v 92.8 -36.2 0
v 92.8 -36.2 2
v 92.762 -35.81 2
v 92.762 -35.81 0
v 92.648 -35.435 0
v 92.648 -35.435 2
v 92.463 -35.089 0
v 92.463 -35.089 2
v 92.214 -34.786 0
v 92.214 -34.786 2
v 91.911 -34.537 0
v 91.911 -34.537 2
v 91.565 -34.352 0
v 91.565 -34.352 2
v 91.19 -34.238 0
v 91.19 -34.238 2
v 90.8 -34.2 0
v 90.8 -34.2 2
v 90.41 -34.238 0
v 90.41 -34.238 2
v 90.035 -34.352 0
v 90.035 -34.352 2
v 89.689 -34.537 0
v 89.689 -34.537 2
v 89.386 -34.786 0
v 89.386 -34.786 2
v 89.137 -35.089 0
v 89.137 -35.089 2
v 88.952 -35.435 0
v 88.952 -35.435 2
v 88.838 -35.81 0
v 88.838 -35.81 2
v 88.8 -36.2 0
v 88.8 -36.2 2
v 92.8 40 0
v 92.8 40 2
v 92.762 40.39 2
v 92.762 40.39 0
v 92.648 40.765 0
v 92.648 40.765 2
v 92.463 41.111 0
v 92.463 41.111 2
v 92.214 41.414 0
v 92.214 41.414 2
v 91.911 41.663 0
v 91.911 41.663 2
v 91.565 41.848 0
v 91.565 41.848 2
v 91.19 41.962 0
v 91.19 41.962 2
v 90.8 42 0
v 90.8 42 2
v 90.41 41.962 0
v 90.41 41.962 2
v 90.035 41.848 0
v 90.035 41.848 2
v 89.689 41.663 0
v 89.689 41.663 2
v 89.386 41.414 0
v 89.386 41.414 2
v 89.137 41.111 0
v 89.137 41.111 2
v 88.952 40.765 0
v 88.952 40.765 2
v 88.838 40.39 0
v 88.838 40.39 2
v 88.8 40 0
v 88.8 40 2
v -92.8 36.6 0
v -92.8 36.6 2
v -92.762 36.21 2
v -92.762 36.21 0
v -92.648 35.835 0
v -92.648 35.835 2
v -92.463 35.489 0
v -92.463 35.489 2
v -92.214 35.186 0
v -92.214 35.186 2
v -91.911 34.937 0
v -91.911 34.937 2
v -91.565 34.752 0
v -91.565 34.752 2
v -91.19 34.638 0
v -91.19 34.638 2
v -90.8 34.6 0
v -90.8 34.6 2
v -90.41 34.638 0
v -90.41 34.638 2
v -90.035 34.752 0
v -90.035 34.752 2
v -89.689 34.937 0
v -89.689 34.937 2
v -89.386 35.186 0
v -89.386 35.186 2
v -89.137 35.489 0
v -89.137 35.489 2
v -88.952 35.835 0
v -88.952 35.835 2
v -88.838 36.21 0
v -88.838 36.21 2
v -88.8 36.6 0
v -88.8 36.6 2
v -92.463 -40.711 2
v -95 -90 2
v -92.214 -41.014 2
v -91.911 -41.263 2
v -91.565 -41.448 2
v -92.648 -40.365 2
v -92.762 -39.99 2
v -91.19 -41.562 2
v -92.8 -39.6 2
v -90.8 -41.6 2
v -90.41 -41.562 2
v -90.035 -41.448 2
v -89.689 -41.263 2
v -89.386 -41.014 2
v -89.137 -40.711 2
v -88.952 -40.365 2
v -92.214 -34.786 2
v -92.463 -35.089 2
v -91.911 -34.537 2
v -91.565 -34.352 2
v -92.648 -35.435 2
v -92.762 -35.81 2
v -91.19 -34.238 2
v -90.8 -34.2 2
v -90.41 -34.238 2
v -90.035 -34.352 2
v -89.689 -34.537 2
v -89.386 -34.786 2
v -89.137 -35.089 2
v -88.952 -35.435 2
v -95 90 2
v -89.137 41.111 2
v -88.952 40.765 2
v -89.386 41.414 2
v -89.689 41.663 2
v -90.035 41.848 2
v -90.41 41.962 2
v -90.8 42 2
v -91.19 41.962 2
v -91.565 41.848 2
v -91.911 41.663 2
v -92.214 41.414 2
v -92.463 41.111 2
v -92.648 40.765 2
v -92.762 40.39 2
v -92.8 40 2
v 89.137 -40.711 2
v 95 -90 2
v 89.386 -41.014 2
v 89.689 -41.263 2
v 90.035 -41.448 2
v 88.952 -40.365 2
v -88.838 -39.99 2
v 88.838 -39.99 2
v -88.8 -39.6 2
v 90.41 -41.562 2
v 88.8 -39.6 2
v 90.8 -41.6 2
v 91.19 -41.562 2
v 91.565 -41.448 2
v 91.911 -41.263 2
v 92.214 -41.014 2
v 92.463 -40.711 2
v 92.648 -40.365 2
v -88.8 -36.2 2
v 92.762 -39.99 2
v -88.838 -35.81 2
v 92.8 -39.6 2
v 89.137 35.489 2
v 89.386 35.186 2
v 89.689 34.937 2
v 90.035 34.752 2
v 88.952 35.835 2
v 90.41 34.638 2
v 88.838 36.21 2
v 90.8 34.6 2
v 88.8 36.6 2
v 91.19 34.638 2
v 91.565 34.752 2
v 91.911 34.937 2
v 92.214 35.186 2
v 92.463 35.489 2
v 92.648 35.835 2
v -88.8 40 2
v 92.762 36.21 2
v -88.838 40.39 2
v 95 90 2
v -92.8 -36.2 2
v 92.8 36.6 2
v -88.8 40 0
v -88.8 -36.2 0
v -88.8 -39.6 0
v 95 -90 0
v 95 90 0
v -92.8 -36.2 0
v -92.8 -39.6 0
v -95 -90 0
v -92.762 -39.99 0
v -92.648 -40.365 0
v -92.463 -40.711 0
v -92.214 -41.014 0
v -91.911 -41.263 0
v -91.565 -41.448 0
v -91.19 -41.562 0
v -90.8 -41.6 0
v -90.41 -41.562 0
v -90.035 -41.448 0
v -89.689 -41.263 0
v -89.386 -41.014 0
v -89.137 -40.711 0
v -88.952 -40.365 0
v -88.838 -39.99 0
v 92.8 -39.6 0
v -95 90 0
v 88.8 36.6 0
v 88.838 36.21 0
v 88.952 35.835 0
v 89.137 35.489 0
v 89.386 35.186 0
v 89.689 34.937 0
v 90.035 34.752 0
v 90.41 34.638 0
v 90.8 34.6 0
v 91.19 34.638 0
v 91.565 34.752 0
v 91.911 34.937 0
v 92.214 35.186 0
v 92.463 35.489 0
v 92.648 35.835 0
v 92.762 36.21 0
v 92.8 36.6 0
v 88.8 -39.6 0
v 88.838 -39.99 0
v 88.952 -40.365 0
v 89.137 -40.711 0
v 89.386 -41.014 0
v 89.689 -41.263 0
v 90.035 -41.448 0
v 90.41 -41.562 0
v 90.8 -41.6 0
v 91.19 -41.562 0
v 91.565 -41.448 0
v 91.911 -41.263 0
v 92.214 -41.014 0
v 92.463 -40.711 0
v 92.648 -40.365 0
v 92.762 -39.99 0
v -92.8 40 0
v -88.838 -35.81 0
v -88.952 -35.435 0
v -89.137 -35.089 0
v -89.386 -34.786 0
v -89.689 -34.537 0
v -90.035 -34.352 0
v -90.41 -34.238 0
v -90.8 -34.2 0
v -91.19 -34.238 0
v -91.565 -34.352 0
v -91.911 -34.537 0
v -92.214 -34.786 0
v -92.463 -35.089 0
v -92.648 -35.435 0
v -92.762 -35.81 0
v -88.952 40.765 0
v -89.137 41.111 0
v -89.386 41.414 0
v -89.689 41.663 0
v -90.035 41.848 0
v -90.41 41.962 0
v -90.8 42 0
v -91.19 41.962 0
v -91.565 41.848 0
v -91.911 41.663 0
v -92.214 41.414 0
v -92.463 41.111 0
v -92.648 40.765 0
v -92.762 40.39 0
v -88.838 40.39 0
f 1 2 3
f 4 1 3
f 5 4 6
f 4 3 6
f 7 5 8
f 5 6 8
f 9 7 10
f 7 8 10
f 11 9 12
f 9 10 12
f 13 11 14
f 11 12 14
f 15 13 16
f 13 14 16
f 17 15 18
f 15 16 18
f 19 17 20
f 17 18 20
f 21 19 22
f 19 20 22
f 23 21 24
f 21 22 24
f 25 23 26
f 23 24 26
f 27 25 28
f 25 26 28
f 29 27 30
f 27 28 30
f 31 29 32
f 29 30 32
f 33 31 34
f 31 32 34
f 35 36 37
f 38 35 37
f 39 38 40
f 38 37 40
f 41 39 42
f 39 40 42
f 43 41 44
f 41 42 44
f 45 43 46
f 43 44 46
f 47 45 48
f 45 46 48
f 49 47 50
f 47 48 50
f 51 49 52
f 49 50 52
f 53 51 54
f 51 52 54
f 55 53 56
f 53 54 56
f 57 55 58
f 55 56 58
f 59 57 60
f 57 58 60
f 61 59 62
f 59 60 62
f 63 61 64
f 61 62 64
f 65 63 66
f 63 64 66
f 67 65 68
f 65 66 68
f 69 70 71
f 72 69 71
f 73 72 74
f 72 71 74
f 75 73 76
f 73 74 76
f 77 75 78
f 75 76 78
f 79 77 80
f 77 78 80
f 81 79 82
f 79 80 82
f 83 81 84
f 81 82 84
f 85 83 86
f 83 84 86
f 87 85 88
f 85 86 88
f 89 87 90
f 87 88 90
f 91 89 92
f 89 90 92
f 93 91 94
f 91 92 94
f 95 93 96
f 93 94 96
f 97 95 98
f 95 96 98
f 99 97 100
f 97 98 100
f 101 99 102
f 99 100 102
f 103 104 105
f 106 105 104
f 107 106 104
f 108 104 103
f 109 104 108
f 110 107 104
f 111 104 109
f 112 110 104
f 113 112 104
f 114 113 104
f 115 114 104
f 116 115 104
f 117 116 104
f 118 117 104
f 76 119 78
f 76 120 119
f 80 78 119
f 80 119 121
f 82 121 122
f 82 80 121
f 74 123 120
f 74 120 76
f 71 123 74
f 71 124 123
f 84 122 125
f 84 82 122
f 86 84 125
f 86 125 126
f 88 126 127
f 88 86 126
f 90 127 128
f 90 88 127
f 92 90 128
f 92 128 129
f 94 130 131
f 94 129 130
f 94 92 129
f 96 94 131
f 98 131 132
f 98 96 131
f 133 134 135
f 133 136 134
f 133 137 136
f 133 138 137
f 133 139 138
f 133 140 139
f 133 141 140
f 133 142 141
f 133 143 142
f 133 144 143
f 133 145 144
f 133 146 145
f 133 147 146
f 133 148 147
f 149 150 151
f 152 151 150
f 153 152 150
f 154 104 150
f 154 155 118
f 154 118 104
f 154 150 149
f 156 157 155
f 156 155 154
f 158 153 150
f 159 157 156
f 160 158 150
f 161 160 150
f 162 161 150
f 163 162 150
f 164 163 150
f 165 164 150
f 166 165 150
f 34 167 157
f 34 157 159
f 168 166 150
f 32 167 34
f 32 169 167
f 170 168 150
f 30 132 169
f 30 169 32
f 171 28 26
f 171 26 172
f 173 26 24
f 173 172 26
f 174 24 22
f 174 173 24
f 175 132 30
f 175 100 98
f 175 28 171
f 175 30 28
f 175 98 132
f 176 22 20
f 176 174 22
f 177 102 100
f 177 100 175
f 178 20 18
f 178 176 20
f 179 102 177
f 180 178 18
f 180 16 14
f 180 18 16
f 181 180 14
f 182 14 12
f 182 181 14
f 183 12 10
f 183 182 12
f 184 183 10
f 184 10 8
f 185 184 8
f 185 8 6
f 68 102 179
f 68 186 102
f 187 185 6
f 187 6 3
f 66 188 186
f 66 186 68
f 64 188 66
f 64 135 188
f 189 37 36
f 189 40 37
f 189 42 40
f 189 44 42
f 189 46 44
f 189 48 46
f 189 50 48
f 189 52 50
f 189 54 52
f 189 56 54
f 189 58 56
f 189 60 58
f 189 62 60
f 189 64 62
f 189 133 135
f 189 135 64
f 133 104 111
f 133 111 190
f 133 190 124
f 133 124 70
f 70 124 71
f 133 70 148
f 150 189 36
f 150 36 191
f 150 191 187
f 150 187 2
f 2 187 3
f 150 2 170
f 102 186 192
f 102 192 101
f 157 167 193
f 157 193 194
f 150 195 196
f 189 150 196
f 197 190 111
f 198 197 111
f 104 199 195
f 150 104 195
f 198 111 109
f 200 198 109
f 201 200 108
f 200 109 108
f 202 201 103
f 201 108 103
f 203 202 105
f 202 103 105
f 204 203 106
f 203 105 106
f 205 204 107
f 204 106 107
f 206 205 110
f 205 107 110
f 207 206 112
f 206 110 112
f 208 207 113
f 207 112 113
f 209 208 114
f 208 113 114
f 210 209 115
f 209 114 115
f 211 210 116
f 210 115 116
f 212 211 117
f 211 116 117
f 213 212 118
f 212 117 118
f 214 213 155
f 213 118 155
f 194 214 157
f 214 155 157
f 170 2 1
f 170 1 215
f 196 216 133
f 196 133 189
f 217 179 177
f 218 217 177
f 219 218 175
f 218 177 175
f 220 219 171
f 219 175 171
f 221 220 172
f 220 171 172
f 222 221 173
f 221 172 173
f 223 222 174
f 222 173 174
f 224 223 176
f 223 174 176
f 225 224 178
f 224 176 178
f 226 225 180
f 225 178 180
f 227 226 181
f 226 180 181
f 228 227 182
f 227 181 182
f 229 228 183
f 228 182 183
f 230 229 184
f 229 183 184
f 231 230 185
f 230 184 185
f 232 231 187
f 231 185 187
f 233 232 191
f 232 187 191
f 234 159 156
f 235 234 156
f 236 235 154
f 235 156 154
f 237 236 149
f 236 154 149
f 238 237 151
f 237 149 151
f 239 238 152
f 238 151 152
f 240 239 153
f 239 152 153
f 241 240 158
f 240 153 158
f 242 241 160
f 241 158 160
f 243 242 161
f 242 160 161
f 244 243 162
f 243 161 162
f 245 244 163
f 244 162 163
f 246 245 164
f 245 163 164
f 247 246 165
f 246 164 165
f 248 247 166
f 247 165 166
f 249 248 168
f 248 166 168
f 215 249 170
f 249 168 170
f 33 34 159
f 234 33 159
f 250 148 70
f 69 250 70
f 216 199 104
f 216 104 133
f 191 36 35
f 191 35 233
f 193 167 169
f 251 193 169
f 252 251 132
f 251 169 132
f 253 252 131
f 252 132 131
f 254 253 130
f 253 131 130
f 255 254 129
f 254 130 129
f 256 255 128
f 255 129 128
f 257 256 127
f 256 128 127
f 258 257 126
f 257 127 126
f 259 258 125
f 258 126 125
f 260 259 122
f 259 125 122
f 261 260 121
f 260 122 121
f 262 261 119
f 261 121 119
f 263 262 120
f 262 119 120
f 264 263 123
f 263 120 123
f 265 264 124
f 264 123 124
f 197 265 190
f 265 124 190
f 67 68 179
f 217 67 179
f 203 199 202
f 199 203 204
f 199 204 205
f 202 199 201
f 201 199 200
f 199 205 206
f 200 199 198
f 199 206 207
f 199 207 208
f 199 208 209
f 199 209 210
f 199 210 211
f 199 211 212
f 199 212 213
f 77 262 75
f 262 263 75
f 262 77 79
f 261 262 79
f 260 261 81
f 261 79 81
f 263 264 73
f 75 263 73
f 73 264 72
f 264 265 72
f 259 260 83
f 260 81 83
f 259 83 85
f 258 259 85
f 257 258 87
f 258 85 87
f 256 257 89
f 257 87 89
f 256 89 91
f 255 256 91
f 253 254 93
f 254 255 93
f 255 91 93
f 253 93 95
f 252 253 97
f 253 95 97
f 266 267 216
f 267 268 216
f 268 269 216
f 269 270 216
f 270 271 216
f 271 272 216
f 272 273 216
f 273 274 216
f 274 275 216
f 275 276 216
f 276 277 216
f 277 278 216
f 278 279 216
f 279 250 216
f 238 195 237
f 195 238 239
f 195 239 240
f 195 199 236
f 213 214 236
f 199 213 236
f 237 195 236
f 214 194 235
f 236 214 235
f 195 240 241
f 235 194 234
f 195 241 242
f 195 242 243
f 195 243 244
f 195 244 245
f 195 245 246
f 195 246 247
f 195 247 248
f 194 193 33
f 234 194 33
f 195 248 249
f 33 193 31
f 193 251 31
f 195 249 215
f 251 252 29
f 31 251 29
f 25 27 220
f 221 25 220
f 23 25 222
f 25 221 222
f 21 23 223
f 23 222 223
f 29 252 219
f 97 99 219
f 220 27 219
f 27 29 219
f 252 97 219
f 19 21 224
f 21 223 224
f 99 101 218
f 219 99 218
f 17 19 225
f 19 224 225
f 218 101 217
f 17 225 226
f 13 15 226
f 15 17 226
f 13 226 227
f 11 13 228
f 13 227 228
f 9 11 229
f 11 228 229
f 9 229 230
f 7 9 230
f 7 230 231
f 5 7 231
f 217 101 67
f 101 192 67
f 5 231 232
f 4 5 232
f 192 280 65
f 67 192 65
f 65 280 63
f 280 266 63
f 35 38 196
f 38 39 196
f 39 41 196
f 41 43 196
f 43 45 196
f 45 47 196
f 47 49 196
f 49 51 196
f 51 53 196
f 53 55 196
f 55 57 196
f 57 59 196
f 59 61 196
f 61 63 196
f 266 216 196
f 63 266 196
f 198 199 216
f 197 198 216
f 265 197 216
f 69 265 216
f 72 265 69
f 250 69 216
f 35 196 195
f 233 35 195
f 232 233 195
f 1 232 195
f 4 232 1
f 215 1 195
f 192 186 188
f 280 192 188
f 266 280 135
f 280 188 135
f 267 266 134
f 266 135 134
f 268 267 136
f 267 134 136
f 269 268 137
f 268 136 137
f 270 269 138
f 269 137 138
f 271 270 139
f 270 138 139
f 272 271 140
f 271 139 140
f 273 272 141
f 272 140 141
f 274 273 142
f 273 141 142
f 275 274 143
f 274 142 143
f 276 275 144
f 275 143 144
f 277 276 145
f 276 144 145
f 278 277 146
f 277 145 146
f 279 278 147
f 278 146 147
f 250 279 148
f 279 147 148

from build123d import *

# Parameters (mm, degrees)
SKETCH_W     = 190
SKETCH_H     = 180
PAD_DEPTH    = 2
POCKET_DEPTH = 5


with BuildPart() as part:
    # Sketch → Pad (new body)
    with BuildSketch(Plane.XY):
        Rectangle(SKETCH_W, SKETCH_H)
    extrude(amount=PAD_DEPTH)

    # Sketch001 (on Face6 of Pad) → Pocket (cut)
    with BuildSketch(Plane.XY.offset(2)):
        with BuildLine():
            ThreePointArc((-88.8, 40), (-90.8, 42), (-92.8, 40))
            Line((-92.8, 40), (-92.8, 36.6))
            ThreePointArc((-92.8, 36.6), (-90.8, 34.6), (-88.8, 36.6))
            Line((-88.8, 40), (-88.8, 36.6))
        make_face()
        with BuildLine():
            ThreePointArc((92.8, 40), (90.8, 42), (88.8, 40))
            Line((88.8, 40), (88.8, 36.6))
            ThreePointArc((88.8, 36.6), (90.8, 34.6), (92.8, 36.6))
            Line((92.8, 40), (92.8, 36.6))
        make_face()
        with BuildLine():
            ThreePointArc((-88.8, -36.2), (-90.8, -34.2), (-92.8, -36.2))
            Line((-92.8, -36.2), (-92.8, -39.6))
            ThreePointArc((-92.8, -39.6), (-90.8, -41.6), (-88.8, -39.6))
            Line((-88.8, -36.2), (-88.8, -39.6))
        make_face()
        with BuildLine():
            ThreePointArc((92.8, -36.2), (90.8, -34.2), (88.8, -36.2))
            Line((88.8, -36.2), (88.8, -39.6))
            ThreePointArc((88.8, -39.6), (90.8, -41.6), (92.8, -39.6))
            Line((92.8, -36.2), (92.8, -39.6))
        make_face()
    extrude(amount=-POCKET_DEPTH, mode=Mode.SUBTRACT)


solid = part.part
